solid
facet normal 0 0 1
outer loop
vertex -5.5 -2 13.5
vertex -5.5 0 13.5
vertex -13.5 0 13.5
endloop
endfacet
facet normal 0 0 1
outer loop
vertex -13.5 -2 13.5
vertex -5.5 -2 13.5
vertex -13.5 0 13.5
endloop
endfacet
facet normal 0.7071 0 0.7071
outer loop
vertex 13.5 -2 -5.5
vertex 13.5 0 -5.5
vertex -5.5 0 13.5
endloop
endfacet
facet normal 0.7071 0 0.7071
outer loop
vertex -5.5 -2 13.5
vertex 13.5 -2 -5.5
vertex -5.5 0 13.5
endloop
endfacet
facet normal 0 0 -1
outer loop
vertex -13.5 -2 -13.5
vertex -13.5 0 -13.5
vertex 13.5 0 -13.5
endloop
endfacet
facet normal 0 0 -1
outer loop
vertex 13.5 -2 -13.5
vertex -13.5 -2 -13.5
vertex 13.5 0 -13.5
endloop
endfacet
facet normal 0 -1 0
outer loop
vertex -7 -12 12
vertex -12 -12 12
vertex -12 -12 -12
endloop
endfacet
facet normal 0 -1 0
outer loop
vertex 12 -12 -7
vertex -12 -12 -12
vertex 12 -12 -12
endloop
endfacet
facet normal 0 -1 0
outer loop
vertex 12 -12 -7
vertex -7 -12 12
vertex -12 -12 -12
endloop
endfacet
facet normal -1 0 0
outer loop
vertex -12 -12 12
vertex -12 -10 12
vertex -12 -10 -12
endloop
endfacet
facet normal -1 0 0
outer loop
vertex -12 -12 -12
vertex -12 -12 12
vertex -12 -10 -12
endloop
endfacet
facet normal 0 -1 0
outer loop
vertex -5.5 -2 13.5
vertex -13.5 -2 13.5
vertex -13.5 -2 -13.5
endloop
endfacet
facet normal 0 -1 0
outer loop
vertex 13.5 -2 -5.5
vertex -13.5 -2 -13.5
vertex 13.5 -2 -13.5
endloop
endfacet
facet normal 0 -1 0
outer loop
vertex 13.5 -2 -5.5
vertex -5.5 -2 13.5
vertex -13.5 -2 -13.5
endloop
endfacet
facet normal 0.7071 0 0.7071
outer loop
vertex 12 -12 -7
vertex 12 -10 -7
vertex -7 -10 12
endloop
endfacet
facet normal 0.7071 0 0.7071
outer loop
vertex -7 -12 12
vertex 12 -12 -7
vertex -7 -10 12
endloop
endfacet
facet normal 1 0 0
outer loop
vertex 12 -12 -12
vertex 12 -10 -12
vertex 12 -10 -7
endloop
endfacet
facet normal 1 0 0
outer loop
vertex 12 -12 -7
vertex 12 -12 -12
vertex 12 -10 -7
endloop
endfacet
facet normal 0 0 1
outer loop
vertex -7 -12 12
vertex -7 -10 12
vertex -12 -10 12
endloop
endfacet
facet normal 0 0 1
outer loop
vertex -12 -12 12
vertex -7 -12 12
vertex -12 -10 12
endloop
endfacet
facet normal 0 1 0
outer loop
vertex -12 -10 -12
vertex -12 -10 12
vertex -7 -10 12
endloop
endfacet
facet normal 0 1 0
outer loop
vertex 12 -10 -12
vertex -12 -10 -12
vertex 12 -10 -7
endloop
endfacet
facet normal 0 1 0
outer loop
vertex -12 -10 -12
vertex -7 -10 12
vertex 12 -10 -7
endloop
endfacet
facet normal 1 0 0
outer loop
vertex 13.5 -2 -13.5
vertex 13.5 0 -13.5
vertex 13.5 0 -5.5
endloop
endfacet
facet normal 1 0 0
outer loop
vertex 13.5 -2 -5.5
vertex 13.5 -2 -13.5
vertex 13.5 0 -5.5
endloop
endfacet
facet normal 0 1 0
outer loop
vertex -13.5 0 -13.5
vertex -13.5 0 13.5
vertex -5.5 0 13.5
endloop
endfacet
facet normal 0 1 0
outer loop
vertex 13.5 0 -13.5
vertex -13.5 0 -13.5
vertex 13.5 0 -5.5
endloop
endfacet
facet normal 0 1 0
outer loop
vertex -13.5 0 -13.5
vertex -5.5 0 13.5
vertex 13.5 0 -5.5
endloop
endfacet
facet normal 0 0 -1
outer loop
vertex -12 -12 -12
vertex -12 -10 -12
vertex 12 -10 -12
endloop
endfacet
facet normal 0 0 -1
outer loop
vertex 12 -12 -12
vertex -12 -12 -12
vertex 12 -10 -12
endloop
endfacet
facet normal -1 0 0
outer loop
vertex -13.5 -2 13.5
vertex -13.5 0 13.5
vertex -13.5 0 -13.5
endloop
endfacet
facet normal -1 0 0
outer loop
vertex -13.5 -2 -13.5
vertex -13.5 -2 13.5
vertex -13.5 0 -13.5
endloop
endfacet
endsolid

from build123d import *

# Parameters (mm, degrees)
F1_DEPTH = 2
F4_DEPTH = 2


with BuildPart() as f1:
    # F0 (on Front) → F1 (new body)
    with BuildSketch(Plane.XZ):
        Polygon((-13.5, -13.5), (13.5, -13.5), (13.5, -5.5), (-5.5, 13.5), (-13.5, 13.5), align=None)
    extrude(amount=F1_DEPTH)


with BuildPart() as f4:
    # F3 (on offset) → F4 (new body)
    with BuildSketch(Plane.XZ.offset(10)):
        Polygon((-12, -12), (12, -12), (12, -7), (-7, 12), (-12, 12), align=None)
    extrude(amount=F4_DEPTH)


solid = Compound([f1.part, f4.part])
